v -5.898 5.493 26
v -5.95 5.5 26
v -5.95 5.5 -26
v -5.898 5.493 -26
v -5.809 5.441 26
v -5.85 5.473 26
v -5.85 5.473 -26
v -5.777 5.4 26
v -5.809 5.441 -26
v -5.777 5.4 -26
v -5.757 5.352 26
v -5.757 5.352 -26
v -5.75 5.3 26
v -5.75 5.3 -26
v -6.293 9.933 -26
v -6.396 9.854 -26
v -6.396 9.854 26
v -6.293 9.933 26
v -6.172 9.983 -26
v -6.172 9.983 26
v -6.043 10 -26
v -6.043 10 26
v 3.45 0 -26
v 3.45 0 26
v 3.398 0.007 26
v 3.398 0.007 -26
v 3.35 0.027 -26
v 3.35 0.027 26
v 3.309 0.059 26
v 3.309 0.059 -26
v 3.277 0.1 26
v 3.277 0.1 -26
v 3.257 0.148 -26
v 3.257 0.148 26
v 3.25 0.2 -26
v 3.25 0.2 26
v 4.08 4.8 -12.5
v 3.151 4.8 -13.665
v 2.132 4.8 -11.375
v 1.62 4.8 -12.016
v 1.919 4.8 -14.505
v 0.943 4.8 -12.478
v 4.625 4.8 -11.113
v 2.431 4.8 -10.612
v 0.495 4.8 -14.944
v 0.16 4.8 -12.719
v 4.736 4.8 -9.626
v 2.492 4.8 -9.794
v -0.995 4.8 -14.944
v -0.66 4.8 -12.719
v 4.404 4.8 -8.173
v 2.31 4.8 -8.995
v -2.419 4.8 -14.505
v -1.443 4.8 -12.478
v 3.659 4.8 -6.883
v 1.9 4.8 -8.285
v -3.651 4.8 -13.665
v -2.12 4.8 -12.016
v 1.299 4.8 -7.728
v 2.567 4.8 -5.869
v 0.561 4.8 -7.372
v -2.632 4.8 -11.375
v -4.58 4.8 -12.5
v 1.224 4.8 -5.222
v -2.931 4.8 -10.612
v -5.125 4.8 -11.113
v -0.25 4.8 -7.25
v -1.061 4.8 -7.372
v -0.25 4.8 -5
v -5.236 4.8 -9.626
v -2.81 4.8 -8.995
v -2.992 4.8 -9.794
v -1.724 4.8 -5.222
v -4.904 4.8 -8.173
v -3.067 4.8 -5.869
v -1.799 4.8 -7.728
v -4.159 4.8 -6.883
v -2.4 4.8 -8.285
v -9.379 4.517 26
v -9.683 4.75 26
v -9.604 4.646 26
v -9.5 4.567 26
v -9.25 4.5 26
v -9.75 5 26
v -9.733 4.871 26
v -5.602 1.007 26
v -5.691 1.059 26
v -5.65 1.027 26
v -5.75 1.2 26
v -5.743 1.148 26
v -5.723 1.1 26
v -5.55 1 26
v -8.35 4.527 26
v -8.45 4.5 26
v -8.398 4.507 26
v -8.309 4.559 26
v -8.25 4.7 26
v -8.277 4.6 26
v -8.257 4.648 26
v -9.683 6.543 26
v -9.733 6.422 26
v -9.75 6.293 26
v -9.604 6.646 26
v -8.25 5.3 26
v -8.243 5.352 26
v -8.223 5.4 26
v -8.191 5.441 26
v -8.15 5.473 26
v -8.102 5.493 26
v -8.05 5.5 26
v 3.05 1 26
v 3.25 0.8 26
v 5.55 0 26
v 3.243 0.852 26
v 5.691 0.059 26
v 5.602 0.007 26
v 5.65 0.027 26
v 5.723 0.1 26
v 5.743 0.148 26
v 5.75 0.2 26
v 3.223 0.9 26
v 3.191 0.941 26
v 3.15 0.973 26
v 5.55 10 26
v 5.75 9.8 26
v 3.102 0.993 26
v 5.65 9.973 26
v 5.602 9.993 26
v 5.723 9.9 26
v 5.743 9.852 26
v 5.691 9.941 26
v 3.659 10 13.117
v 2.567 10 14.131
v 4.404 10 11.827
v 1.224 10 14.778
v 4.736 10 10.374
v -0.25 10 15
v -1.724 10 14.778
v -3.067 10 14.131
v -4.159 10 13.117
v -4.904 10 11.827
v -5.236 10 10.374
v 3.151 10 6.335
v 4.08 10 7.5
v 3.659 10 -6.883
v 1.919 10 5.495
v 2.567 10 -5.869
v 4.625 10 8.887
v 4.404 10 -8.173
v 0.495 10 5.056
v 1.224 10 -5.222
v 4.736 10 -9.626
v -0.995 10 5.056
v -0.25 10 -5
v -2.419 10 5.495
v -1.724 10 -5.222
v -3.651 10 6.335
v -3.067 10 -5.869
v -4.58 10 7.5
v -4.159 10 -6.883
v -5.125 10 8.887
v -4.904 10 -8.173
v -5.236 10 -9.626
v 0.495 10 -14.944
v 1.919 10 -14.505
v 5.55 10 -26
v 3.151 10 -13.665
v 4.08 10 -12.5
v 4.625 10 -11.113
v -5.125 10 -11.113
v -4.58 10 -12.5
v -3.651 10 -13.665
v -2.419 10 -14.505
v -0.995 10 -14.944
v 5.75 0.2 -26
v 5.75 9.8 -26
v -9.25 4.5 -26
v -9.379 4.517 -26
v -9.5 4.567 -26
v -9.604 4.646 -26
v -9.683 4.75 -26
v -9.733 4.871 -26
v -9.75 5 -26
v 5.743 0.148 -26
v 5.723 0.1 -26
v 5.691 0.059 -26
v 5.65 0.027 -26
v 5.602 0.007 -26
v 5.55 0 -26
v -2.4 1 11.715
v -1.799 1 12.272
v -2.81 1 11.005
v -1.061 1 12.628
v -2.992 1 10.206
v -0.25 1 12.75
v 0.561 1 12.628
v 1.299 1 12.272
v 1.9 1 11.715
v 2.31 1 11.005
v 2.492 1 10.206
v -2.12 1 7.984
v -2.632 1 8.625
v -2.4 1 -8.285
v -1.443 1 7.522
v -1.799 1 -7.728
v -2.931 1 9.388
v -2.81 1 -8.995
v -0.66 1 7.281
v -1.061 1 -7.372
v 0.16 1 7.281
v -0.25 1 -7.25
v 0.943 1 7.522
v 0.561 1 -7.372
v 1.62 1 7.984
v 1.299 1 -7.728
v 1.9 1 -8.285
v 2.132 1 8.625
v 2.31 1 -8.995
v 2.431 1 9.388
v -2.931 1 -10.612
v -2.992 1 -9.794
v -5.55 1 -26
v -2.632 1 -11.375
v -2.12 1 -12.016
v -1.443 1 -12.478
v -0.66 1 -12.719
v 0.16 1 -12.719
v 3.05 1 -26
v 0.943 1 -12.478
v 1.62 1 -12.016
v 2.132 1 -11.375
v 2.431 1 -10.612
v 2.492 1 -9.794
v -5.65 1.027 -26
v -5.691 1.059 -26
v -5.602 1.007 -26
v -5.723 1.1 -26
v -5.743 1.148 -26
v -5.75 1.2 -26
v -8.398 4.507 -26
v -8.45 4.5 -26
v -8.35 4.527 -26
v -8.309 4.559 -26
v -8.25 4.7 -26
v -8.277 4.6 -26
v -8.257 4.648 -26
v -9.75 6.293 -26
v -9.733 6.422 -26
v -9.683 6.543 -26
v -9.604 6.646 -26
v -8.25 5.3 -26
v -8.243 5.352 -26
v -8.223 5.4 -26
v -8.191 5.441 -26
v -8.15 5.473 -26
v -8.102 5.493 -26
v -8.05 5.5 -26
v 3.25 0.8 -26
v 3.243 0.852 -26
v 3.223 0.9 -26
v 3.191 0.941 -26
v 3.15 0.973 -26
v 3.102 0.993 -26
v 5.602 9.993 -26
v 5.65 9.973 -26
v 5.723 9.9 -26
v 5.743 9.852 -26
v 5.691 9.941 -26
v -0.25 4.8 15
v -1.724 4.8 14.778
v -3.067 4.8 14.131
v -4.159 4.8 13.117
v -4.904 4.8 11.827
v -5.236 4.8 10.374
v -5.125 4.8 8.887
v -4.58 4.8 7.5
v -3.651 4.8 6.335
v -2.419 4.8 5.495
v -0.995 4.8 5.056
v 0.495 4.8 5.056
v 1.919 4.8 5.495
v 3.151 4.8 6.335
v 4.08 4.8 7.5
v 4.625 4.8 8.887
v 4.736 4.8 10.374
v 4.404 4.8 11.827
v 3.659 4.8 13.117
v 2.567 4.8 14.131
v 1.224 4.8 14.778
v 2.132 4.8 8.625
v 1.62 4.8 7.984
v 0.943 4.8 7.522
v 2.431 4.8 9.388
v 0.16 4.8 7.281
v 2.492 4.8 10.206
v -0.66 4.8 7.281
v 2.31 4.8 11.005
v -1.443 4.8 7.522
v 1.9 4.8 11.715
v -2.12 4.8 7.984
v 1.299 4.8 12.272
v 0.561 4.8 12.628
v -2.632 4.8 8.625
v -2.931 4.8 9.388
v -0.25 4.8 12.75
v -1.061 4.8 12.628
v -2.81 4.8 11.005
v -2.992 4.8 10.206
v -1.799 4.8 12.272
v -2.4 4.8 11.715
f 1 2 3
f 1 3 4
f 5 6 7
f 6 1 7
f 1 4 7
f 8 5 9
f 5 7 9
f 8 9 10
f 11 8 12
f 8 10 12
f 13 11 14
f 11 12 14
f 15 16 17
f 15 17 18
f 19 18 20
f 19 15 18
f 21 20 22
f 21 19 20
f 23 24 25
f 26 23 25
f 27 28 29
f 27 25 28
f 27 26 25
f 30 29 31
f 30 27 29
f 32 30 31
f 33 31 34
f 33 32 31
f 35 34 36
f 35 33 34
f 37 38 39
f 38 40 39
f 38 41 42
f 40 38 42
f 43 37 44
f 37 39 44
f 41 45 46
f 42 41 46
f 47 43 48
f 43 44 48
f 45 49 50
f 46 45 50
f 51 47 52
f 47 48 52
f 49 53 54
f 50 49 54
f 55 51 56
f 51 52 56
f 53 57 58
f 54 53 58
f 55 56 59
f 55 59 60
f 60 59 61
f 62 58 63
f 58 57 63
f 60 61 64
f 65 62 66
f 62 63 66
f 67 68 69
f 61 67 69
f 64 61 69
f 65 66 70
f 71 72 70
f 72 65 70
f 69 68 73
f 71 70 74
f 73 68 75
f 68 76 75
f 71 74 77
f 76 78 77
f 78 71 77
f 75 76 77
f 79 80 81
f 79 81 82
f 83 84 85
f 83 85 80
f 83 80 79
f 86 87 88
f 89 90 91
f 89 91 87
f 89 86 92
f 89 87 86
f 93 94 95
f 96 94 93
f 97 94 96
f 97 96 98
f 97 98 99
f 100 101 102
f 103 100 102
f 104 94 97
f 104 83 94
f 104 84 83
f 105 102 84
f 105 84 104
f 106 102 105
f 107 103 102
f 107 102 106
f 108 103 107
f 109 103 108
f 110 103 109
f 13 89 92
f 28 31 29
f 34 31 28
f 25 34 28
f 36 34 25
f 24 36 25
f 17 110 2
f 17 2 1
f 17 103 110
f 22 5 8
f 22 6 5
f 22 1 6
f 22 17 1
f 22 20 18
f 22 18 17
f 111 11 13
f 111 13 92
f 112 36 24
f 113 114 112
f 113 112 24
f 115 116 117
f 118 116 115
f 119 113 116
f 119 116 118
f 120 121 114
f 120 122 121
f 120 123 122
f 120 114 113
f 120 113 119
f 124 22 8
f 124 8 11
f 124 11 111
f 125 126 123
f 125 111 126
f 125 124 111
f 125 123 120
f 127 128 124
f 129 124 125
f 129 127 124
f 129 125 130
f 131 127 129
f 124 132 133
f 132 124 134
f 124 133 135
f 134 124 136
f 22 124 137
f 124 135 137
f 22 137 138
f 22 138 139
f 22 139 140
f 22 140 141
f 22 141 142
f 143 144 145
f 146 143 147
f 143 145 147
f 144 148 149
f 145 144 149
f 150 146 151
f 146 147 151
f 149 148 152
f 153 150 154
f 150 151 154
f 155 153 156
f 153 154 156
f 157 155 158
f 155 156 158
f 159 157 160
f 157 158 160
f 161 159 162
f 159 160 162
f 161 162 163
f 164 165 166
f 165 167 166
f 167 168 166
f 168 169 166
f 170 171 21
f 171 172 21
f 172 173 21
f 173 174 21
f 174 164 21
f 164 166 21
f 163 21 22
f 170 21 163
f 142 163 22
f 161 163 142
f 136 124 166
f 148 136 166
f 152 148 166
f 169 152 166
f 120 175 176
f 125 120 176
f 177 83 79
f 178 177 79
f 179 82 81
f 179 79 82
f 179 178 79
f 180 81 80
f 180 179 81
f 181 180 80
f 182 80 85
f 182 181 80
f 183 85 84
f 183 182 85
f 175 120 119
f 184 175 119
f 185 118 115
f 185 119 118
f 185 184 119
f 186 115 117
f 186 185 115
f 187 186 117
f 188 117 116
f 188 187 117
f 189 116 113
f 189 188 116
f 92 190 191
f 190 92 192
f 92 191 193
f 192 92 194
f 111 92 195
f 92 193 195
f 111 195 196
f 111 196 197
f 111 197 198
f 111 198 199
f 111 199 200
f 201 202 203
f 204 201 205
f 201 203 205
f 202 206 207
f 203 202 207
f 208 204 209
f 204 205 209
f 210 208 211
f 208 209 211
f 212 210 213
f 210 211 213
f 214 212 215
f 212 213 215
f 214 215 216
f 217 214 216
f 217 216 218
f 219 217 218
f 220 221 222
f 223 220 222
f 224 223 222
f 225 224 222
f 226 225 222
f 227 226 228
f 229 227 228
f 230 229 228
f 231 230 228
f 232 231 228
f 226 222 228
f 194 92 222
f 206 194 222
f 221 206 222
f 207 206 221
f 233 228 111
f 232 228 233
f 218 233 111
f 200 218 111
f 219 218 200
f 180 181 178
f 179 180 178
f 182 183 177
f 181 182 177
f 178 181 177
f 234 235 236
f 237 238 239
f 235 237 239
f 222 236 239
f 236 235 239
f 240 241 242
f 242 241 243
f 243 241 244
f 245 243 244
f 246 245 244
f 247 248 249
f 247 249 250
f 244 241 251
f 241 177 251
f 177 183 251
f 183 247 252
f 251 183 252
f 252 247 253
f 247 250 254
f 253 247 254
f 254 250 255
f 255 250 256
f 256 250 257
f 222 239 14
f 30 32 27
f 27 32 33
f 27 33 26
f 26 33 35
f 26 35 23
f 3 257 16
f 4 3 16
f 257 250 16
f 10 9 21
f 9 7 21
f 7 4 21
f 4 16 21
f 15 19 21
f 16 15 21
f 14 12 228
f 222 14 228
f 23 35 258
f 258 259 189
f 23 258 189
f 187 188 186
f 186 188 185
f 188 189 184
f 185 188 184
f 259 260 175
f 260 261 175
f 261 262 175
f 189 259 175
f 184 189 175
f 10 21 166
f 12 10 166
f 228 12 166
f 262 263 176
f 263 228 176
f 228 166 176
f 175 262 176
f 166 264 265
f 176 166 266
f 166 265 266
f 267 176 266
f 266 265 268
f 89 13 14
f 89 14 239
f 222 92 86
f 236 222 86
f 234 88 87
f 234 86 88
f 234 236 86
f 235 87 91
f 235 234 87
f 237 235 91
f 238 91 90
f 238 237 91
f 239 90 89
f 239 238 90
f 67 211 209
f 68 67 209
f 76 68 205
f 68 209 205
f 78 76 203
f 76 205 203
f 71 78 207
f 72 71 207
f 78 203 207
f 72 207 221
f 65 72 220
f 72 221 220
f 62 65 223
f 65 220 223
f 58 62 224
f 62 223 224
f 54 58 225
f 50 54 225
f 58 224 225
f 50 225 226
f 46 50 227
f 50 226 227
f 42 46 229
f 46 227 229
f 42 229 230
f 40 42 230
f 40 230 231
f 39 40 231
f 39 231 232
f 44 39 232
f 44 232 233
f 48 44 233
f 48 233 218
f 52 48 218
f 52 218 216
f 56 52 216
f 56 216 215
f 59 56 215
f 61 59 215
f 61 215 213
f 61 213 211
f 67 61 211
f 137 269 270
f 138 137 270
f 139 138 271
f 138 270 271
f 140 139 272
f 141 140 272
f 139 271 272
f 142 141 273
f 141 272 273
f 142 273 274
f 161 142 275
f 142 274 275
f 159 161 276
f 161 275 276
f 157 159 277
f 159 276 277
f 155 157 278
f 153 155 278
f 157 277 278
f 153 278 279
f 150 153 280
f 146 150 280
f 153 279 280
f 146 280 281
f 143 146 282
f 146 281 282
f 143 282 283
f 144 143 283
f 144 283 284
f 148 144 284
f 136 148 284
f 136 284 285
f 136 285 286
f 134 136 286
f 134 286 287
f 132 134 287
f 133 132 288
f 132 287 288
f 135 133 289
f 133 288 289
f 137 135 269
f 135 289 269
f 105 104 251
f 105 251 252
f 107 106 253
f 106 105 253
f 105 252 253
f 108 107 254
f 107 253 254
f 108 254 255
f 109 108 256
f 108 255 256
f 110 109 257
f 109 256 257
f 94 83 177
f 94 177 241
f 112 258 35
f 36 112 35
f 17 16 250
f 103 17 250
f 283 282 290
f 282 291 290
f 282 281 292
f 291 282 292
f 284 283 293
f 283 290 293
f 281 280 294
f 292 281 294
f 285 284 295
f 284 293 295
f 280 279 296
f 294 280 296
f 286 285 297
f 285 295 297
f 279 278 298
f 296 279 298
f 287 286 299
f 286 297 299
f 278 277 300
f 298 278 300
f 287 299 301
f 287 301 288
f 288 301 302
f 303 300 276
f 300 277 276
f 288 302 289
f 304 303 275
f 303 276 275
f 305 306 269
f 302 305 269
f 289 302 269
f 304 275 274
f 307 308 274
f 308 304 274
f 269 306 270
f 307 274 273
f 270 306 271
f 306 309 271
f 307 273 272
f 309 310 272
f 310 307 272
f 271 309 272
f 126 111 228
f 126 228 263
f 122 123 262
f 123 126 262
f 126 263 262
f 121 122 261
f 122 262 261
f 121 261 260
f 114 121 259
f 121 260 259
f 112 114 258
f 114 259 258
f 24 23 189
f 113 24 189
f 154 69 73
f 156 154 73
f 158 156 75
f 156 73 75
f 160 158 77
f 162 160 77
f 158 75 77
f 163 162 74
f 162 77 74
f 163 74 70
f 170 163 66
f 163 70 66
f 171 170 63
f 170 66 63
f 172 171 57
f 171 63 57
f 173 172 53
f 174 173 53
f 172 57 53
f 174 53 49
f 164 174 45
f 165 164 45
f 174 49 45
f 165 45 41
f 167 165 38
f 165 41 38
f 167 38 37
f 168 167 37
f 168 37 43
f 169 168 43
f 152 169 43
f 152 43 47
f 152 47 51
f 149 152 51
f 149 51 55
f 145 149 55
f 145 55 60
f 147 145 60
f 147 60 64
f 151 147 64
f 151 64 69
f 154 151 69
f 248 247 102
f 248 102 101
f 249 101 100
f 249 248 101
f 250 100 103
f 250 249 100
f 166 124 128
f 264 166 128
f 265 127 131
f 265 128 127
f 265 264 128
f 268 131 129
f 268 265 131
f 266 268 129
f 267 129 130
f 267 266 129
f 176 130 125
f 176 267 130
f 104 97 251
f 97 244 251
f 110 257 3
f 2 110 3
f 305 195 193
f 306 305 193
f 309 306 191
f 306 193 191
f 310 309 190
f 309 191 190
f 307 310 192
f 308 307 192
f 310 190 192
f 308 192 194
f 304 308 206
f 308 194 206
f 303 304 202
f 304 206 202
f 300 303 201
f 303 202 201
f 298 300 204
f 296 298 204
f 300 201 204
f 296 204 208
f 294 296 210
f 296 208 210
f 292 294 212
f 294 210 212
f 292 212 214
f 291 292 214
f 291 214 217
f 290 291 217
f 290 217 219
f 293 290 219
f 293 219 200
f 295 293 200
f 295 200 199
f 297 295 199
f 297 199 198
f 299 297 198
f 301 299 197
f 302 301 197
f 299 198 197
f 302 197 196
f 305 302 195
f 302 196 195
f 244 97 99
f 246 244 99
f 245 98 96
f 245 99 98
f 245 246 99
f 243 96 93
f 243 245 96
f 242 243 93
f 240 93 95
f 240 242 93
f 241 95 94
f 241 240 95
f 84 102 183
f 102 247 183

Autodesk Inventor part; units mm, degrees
sketch "Sketch_4" plane through (0, 0, 0) normal (0, 0, 1) x (1, 0, 0)
  line L0 (-9.75, 6.2929) -> (-9.75, 5)
  arc A0 (-9.75, 5) -> (-9.25, 4.5) centre (-9.25, 5) ccw
  line L1 (-9.25, 4.5) -> (-8.45, 4.5)
  arc A1 (-8.45, 4.5) -> (-8.25, 4.7) centre (-8.45, 4.7) ccw
  line L2 (-8.25, 4.7) -> (-8.25, 5.3)
  arc A2 (-8.05, 5.5) -> (-8.25, 5.3) centre (-8.05, 5.3) ccw
  line L3 (-8.05, 5.5) -> (-5.95, 5.5)
  arc A3 (-5.75, 5.3) -> (-5.95, 5.5) centre (-5.95, 5.3) ccw
  line L4 (-5.75, 5.3) -> (-5.75, 1.2)
  arc A4 (-5.75, 1.2) -> (-5.55, 1) centre (-5.55, 1.2) ccw
  line L5 (-5.55, 1) -> (3.05, 1)
  arc A5 (3.25, 0.8) -> (3.05, 1) centre (3.05, 0.8) ccw
  line L6 (3.25, 0.8) -> (3.25, 0.2)
  arc A6 (3.25, 0.2) -> (3.45, 0) centre (3.45, 0.2) ccw
  line L7 (3.45, 0) -> (5.55, 0)
  arc A7 (5.55, 0) -> (5.75, 0.2) centre (5.55, 0.2) ccw
  line L8 (5.75, 0.2) -> (5.75, 9.8)
  arc A8 (5.75, 9.8) -> (5.55, 10) centre (5.55, 9.8) ccw
  line L9 (5.55, 10) -> (-6.0429, 10)
  arc A9 (-6.0429, 10) -> (-6.3964, 9.8536) centre (-6.0429, 9.5) ccw
  line L10 (-6.3964, 9.8536) -> (-9.6036, 6.6464)
  arc A10 (-9.6036, 6.6464) -> (-9.75, 6.2929) centre (-9.25, 6.2929) ccw
extrude "Extrusion1" add sketch "Sketch_4" along normal mid plane 52
sketch "Sketch2" plane through (-6.0429, 10, 26) normal (0, 1, 0) x (1, 0, 0)
  point P0 (5.7929, 36)
hole "Hole1" at (-0.25, 10, -10) direction (0, -1, 0) diameter 5.5 depth 10 counterbore diameter 10 counterbore depth 5.2
sketch "Sketch3" plane through (-6.0429, 10, 26) normal (0, 1, 0) x (1, 0, 0)
  point P0 (5.7929, 16)
hole "Hole2" at (-0.25, 10, 10) direction (0, -1, 0) diameter 5.5 depth 10 counterbore diameter 10 counterbore depth 5.2
ref_plane "KLEMMLEISTE_XY" through (-0.25, 0, 0) normal (0, 1, 0) x (1, 0, 0)
ref_plane "KLEMMLEISTE_YZ" through (-0.25, 0, 0) normal (1, 0, 0) x (0, 0, -1)
ref_plane "KLEMMLEISTE_ZX" through (-0.25, 0, 0) normal (0, 0, -1) x (0, 1, 0)
ref_plane "SCHRAUBE_1_XY" through (-0.25, 4.8, -10) normal (0, 1, 0) x (1, 0, 0)
ref_plane "SCHRAUBE_1_YZ" through (-0.25, 4.8, -10) normal (1, 0, 0) x (0, 0, -1)
ref_plane "SCHRAUBE_1_ZX" through (-0.25, 4.8, -10) normal (0, 0, -1) x (0, 1, 0)
ref_plane "SCHRAUBE_2_XY" through (-0.25, 4.8, 10) normal (0, 1, 0) x (1, 0, 0)
ref_plane "SCHRAUBE_2_YZ" through (-0.25, 4.8, 10) normal (1, 0, 0) x (0, 0, -1)
ref_plane "SCHRAUBE_2_ZX" through (-0.25, 4.8, 10) normal (0, 0, -1) x (0, 1, 0)
properties part number "722624 MUE-70/80P1"
